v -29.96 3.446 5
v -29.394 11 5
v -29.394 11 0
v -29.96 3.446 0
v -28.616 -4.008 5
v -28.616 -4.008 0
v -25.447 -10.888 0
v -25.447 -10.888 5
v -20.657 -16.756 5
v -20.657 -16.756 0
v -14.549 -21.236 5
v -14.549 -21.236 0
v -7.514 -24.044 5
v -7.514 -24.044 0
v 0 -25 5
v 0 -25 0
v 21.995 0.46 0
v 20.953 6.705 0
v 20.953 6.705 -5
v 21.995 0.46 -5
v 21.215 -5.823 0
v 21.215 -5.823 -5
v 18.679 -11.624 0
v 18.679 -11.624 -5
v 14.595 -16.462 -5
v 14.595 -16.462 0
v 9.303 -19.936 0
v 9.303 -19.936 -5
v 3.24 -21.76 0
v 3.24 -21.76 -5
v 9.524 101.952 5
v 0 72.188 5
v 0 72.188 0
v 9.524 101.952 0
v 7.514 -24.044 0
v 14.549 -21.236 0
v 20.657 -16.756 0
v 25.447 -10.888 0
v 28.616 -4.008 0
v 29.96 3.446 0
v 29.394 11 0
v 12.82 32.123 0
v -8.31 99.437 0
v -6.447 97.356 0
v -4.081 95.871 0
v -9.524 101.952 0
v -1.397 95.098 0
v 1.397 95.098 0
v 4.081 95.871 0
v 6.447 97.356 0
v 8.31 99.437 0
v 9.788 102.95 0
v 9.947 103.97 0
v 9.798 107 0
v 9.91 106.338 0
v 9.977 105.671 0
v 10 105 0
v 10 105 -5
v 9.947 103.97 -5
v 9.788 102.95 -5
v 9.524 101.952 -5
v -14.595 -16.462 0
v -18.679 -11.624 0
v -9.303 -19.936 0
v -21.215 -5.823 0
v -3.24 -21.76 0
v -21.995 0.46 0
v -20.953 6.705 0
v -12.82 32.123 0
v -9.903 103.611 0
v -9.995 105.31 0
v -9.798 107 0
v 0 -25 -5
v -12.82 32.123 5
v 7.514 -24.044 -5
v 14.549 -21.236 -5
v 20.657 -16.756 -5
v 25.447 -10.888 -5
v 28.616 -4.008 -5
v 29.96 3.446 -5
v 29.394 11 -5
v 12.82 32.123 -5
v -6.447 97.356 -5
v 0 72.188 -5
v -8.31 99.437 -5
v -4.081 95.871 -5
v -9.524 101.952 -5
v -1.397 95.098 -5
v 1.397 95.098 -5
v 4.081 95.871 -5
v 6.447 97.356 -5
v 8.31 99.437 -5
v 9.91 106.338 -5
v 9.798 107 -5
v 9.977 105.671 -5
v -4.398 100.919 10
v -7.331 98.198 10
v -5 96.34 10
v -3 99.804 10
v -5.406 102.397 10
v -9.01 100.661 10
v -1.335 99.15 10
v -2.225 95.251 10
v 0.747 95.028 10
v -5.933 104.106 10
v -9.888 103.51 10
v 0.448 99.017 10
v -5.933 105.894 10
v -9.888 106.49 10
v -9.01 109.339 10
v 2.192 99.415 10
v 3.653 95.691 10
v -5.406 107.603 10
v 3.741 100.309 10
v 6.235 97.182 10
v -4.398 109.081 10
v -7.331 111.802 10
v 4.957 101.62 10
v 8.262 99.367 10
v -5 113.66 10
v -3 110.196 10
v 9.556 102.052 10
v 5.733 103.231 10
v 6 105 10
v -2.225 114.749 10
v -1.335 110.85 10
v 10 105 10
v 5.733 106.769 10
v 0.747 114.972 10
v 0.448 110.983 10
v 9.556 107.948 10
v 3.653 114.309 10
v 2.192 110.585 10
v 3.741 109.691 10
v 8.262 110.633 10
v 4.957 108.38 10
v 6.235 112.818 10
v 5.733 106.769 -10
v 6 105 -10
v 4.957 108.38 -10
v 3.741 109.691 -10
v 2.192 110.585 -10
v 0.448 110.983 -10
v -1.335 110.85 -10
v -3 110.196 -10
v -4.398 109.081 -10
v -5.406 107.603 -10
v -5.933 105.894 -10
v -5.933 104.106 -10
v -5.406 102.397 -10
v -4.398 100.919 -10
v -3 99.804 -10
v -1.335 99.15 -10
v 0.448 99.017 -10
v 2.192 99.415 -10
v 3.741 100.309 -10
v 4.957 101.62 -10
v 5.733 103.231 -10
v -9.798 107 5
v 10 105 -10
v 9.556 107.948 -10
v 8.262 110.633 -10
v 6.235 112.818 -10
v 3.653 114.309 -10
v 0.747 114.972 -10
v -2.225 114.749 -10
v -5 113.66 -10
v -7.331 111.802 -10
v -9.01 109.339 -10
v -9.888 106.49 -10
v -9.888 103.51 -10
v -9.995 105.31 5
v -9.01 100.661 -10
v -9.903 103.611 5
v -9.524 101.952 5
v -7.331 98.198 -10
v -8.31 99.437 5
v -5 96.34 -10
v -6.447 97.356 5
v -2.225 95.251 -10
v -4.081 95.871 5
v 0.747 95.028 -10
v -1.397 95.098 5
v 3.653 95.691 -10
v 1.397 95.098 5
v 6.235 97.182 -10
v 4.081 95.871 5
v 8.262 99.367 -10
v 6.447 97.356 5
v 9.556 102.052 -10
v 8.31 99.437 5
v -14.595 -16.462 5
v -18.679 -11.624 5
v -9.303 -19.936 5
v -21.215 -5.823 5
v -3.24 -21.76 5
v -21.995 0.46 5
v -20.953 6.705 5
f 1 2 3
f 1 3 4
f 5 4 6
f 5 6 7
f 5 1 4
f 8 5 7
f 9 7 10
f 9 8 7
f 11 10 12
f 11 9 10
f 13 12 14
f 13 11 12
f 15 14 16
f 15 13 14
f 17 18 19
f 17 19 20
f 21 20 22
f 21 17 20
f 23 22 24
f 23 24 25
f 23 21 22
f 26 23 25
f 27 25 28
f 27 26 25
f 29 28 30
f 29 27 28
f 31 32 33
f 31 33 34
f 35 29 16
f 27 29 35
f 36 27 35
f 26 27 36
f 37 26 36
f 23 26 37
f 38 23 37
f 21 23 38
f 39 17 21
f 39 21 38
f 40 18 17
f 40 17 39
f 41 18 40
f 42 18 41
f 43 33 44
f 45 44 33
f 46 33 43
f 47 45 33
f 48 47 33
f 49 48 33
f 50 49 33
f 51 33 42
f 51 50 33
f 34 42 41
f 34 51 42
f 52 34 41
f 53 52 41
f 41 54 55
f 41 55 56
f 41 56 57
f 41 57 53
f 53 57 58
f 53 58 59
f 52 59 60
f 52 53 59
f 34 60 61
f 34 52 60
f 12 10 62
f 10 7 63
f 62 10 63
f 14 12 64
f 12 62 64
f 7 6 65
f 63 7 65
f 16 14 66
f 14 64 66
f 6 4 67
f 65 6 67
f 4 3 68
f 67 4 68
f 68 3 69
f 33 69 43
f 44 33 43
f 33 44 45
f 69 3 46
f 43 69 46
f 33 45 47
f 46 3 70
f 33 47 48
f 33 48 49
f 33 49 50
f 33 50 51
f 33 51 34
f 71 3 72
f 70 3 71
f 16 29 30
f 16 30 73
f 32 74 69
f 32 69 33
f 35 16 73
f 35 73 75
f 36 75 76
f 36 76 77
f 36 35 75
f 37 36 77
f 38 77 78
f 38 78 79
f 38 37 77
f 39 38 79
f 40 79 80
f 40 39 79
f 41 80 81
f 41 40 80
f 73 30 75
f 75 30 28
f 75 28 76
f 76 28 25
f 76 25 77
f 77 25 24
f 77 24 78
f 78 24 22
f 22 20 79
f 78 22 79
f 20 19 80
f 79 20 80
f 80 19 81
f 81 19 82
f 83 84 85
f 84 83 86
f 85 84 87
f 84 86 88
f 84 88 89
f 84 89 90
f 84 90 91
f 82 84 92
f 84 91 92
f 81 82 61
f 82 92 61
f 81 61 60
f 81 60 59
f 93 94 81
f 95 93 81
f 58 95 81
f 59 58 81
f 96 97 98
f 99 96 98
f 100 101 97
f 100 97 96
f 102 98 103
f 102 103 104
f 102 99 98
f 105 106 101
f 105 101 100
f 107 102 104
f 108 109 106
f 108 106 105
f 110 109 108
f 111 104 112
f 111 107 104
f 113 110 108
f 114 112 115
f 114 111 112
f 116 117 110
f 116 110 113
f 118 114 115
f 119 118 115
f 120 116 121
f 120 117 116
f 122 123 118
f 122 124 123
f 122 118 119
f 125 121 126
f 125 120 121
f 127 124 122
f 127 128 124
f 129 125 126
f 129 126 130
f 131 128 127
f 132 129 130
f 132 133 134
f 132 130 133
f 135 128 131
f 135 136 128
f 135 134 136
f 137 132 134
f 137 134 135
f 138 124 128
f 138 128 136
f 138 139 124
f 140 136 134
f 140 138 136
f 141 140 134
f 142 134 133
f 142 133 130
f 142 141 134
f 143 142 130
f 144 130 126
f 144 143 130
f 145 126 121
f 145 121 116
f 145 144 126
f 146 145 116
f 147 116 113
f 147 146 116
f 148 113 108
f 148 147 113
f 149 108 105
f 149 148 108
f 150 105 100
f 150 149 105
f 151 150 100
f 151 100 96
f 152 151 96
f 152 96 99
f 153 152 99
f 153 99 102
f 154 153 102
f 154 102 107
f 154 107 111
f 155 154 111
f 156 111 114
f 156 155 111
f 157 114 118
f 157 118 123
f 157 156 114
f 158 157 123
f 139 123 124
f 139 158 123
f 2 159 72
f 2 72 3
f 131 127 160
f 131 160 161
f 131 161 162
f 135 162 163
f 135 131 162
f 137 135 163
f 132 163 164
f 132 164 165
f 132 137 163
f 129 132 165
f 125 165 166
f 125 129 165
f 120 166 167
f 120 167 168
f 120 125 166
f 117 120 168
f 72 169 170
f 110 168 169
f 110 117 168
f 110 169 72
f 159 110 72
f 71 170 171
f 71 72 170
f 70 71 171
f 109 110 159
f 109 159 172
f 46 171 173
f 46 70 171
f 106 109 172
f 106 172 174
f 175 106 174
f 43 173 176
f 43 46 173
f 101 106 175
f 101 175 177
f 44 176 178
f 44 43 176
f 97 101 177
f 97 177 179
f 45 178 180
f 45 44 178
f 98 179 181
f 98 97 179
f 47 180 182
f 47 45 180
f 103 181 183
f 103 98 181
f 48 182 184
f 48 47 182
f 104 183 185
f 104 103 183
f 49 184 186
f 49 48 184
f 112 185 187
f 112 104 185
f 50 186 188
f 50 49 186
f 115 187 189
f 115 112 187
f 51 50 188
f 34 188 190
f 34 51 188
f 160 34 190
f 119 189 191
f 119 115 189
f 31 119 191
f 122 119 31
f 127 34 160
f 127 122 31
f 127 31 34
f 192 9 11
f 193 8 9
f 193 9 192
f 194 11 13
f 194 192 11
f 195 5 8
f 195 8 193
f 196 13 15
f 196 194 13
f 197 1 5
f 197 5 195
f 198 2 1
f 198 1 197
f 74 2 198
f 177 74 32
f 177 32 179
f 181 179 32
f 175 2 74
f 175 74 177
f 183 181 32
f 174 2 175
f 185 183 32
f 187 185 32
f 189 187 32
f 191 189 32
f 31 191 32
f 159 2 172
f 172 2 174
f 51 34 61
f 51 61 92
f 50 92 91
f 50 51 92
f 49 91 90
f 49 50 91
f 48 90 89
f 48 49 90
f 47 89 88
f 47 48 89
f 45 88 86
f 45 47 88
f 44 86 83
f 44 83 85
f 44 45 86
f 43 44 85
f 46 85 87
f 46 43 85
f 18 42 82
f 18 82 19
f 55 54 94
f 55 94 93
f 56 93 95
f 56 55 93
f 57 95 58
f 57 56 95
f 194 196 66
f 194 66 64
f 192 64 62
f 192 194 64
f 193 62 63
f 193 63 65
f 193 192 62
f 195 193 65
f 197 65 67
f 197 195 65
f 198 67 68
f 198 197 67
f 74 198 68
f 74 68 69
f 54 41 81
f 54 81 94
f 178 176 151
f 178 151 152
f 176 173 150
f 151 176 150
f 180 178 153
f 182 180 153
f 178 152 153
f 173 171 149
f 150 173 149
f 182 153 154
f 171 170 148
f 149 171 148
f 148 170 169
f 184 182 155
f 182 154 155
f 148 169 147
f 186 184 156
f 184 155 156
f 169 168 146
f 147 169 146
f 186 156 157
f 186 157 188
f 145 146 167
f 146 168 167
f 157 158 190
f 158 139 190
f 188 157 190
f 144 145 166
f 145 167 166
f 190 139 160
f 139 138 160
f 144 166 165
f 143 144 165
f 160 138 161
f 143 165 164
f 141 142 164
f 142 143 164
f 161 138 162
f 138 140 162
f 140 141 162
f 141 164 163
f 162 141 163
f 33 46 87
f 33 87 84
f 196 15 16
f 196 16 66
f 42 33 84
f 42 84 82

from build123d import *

# Parameters (mm, degrees)
SKETCH1_R           = 6.0000000000000036
BOSS_EXTRUDE1_DEPTH = 10
BOSS_EXTRUDE2_DEPTH = 5
BOSS_EXTRUDE9_DEPTH = 5


with BuildPart() as part:
    # Sketch1 → Boss-Extrude1 (new, symmetric)
    with BuildSketch(Plane.XY):
        with BuildLine():
            ThreePointArc((9.79795897113271, 107.00000000000001), (6.1e-16, 115.00000000000001), (-9.79795897113271, 107.00000000000001))
            ThreePointArc((-9.79795897113271, 107.00000000000001), (-9.985334211645554, 104.45861226303066), (-9.524285702381544, 101.95238095238096))
            ThreePointArc((-9.524285702381544, 101.95238095238096), (-1.84e-15, 95.00000000000001), (9.524285702381544, 101.95238095238096))
            ThreePointArc((9.524285702381544, 101.95238095238096), (9.880355687519943, 103.45773819080799), (9.999999999999998, 105.00000000000001))
            ThreePointArc((9.999999999999998, 105.00000000000001), (9.949361530051238, 106.00508962005209), (9.79795897113271, 107.00000000000001))
        make_face()
        with Locations((0, 105.00000000000001)):
            Circle(SKETCH1_R, mode=Mode.SUBTRACT)
    extrude(amount=BOSS_EXTRUDE1_DEPTH, both=True)

    # Sketch1<3> → Boss-Extrude2 (add)
    with BuildSketch(Plane.XY):
        with BuildLine():
            Line((-20.9534285452394, 6.704761904761905), (9.524285702381547, 101.95238095238096))
            ThreePointArc((9.524285702381546, 101.95238095238096), (-2.527516325759122, 95.32468805551879), (-9.797958971132713, 107.00000000000001))
            Line((-9.797958971132712, 107.00000000000001), (-29.393876913398135, 10.999999999999998))
            ThreePointArc((-29.393876913398135, 11.000000000000007), (-23.237900077244504, -13.97366596101027), (-5.51e-15, -25))
            Line((0, -24.999999999999996), (-3.2398704112739285, -21.76012958872607))
            ThreePointArc((-3.2398704112739405, -21.760129588726066), (-18.67863593878897, -11.623620755435104), (-20.953428545239426, 6.704761904761907))
        make_face()
    extrude(amount=BOSS_EXTRUDE2_DEPTH)


with BuildPart() as body_2:
    # Sketch1<8> → Boss-Extrude9 (new body)
    with BuildSketch(Plane.XY):
        with BuildLine():
            Line((3.2398704112739285, -21.76012958872607), (0, -24.999999999999996))
            ThreePointArc((0, -25), (23.237900077244504, -13.973665961010276), (29.393876913398135, 11))
            Line((29.393876913398135, 10.999999999999998), (9.797958971132712, 107.00000000000001))
            ThreePointArc((9.79795897113271, 107.00000000000001), (2.5275163257591244, 95.32468805551879), (-9.524285702381546, 101.95238095238096))
            Line((-9.524285702381547, 101.95238095238096), (20.953428545239394, 6.704761904761895))
            ThreePointArc((20.953428545239394, 6.704761904761899), (18.678635938788936, -11.6236207554351), (3.239870411273928, -21.760129588726066))
        make_face()
    extrude(amount=-BOSS_EXTRUDE9_DEPTH)


solid = Compound([part.part, body_2.part])
